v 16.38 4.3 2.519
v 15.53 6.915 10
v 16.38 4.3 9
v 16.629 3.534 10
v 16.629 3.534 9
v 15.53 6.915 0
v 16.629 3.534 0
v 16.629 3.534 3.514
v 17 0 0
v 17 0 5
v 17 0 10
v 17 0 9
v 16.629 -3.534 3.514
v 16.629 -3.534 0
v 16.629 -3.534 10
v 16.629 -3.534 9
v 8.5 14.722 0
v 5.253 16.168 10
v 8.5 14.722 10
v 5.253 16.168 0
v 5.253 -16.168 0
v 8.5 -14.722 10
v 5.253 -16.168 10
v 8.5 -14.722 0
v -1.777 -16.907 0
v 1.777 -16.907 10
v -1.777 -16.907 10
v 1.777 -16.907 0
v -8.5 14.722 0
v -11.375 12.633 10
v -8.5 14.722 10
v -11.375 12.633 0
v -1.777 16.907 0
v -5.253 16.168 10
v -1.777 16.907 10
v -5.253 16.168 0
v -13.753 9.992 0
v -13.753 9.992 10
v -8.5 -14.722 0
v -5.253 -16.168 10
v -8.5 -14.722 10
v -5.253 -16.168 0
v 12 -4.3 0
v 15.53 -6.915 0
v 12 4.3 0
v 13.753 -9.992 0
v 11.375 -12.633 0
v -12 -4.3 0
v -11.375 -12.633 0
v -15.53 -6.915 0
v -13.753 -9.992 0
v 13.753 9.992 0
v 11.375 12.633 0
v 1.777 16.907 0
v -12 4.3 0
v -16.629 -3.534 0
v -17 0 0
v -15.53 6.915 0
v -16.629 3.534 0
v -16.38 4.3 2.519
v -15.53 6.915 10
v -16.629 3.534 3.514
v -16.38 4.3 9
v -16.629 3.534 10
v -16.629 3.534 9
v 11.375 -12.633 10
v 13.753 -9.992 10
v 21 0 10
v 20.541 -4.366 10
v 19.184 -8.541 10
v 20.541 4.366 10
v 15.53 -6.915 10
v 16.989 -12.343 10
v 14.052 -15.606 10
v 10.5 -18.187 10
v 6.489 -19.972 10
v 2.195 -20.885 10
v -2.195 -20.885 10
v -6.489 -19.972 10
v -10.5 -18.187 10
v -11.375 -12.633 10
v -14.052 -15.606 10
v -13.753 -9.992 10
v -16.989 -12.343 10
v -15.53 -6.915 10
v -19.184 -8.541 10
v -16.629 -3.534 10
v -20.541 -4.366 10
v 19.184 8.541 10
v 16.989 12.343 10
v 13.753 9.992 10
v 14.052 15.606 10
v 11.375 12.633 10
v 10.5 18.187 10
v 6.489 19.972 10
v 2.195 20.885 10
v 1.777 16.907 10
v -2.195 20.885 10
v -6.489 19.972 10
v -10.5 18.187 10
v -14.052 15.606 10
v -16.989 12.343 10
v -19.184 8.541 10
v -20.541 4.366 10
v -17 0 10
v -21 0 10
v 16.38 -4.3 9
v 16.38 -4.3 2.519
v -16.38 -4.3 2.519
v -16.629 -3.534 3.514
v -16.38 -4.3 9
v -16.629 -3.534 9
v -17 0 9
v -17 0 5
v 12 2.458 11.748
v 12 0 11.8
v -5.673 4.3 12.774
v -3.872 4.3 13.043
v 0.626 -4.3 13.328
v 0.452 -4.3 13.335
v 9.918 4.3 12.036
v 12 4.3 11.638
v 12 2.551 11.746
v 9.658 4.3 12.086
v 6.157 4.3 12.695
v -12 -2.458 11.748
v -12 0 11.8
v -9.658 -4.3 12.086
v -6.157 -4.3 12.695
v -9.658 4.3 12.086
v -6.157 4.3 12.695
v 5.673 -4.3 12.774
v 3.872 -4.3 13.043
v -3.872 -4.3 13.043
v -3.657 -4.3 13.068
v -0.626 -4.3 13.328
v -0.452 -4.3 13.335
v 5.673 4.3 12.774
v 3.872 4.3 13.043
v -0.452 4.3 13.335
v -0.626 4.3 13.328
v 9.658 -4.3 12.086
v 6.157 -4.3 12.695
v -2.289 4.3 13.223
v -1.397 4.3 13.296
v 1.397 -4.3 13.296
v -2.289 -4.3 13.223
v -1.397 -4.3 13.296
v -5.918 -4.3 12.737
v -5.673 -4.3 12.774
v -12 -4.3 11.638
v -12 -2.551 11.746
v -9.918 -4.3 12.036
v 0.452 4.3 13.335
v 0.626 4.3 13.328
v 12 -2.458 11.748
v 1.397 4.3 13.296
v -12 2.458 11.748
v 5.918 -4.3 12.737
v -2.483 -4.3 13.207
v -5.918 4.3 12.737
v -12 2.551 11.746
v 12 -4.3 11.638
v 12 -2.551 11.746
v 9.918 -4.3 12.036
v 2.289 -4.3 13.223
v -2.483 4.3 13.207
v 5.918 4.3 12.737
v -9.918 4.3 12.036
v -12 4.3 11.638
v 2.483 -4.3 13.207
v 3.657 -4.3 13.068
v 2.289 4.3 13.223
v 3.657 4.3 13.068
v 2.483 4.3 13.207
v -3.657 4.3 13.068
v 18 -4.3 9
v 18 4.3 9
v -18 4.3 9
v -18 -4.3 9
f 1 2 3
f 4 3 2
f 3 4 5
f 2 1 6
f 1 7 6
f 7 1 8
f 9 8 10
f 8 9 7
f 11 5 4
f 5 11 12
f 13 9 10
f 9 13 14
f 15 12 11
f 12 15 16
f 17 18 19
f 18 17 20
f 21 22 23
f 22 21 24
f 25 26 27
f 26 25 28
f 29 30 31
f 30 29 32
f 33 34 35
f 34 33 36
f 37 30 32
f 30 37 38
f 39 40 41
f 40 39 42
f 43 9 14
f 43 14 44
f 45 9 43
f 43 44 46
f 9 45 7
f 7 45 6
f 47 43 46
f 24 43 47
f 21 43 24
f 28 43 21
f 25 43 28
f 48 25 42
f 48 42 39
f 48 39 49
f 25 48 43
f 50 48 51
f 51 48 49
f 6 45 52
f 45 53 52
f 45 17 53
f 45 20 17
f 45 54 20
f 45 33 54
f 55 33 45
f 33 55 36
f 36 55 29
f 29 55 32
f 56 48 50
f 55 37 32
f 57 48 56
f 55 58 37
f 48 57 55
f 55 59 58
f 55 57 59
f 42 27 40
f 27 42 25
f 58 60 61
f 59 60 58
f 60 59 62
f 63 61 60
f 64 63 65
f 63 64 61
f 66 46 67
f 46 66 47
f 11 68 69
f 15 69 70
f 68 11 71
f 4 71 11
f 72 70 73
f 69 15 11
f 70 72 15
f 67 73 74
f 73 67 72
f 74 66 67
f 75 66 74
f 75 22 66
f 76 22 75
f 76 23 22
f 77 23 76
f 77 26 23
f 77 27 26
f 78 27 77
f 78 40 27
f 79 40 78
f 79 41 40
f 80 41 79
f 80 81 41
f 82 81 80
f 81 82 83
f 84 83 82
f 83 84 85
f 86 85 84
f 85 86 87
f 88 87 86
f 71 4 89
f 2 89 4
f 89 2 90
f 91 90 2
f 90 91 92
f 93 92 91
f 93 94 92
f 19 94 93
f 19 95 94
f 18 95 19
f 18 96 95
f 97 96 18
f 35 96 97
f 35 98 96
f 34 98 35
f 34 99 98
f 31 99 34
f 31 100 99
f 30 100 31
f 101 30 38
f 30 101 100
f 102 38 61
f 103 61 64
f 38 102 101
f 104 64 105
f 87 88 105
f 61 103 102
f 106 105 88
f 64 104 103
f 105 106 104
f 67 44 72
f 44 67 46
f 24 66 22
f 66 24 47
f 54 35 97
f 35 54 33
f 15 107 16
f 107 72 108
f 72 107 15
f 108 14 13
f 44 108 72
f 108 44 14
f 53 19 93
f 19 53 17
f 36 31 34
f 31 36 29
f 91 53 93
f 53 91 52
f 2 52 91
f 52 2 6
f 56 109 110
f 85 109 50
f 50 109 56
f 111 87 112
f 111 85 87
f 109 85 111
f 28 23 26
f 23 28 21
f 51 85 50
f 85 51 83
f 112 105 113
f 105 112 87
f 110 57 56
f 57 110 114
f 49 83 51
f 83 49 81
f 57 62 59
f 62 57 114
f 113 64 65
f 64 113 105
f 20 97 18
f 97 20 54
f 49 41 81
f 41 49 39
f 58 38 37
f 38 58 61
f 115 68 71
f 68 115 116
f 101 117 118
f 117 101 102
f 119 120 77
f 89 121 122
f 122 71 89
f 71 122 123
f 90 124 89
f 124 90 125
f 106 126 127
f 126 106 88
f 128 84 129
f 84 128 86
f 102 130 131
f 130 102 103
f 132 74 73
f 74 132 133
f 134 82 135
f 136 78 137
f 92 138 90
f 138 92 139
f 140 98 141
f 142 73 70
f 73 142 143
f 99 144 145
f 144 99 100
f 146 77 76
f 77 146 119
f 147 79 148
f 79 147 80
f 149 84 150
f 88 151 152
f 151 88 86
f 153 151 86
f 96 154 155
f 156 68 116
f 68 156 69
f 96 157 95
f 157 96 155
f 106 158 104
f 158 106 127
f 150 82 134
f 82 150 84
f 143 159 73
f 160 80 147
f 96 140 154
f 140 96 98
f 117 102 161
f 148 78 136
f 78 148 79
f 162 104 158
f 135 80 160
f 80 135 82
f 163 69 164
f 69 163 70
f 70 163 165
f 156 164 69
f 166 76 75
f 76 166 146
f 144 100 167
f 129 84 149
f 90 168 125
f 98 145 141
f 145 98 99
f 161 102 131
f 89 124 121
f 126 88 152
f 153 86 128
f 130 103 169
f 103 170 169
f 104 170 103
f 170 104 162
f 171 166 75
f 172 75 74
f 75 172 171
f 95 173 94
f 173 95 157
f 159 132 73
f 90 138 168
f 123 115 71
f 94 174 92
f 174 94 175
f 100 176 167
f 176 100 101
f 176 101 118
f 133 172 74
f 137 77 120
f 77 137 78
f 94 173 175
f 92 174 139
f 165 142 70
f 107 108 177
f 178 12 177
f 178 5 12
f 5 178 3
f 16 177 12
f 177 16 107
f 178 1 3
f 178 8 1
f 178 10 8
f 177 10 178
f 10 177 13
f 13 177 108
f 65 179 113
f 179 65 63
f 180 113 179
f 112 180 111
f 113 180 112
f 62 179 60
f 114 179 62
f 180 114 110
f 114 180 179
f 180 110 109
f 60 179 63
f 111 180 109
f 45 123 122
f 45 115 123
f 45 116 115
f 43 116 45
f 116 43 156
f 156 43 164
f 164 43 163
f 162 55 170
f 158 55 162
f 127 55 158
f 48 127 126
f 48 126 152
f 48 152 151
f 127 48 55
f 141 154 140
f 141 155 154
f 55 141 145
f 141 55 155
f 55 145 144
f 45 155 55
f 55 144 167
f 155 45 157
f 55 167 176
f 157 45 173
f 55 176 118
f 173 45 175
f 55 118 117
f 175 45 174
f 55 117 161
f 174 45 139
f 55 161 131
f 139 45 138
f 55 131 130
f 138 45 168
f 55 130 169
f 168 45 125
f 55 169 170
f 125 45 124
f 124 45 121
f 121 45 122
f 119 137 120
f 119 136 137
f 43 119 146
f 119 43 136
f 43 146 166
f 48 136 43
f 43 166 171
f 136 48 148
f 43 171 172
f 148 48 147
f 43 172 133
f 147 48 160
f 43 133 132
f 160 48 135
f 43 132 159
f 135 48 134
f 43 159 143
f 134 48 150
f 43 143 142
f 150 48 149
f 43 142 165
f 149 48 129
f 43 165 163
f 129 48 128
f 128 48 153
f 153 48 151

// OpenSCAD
holeh = 8.6;
plugh = 10;
clips = 16;
clipe = 18;
difference(){
  union(){
    cylinder(plugh, r=17, true);
    translate([0, 0, 10]){
        cylinder(4, 21, true);
    }
    polyhedron(
      [[clips, holeh / 2, 1],
       [clips, holeh / 2, plugh - 1],
       [clips, -holeh / 2, 1],
       [clips, -holeh / 2, plugh - 1],
       [clipe, holeh / 2, plugh - 1],
       [clipe, -holeh / 2, plugh - 1]],
      [[1, 4, 5, 3], // facing top
       [5, 4, 0, 2], // inclined plane
       [0, 1, 3, 2], // back
       // side triangles
       [0, 4, 1],
       [2, 3, 5]]
    );
    polyhedron(
      [[-clips, holeh / 2, 1],
       [-clips, holeh / 2, plugh - 1],
       [-clips, -holeh / 2, 1],
       [-clips, -holeh / 2, plugh - 1],
       [-clipe, holeh / 2, plugh - 1],
       [-clipe, -holeh / 2, plugh - 1]],
      [[1, 4, 5, 3], // facing top
       [5, 4, 0, 2], // inclined plane
       [0, 1, 3, 2], // back
       // side triangles
       [0, 4, 1],
       [2, 3, 5]]
    );
  }
  cube([24, holeh, 50], true);
}
